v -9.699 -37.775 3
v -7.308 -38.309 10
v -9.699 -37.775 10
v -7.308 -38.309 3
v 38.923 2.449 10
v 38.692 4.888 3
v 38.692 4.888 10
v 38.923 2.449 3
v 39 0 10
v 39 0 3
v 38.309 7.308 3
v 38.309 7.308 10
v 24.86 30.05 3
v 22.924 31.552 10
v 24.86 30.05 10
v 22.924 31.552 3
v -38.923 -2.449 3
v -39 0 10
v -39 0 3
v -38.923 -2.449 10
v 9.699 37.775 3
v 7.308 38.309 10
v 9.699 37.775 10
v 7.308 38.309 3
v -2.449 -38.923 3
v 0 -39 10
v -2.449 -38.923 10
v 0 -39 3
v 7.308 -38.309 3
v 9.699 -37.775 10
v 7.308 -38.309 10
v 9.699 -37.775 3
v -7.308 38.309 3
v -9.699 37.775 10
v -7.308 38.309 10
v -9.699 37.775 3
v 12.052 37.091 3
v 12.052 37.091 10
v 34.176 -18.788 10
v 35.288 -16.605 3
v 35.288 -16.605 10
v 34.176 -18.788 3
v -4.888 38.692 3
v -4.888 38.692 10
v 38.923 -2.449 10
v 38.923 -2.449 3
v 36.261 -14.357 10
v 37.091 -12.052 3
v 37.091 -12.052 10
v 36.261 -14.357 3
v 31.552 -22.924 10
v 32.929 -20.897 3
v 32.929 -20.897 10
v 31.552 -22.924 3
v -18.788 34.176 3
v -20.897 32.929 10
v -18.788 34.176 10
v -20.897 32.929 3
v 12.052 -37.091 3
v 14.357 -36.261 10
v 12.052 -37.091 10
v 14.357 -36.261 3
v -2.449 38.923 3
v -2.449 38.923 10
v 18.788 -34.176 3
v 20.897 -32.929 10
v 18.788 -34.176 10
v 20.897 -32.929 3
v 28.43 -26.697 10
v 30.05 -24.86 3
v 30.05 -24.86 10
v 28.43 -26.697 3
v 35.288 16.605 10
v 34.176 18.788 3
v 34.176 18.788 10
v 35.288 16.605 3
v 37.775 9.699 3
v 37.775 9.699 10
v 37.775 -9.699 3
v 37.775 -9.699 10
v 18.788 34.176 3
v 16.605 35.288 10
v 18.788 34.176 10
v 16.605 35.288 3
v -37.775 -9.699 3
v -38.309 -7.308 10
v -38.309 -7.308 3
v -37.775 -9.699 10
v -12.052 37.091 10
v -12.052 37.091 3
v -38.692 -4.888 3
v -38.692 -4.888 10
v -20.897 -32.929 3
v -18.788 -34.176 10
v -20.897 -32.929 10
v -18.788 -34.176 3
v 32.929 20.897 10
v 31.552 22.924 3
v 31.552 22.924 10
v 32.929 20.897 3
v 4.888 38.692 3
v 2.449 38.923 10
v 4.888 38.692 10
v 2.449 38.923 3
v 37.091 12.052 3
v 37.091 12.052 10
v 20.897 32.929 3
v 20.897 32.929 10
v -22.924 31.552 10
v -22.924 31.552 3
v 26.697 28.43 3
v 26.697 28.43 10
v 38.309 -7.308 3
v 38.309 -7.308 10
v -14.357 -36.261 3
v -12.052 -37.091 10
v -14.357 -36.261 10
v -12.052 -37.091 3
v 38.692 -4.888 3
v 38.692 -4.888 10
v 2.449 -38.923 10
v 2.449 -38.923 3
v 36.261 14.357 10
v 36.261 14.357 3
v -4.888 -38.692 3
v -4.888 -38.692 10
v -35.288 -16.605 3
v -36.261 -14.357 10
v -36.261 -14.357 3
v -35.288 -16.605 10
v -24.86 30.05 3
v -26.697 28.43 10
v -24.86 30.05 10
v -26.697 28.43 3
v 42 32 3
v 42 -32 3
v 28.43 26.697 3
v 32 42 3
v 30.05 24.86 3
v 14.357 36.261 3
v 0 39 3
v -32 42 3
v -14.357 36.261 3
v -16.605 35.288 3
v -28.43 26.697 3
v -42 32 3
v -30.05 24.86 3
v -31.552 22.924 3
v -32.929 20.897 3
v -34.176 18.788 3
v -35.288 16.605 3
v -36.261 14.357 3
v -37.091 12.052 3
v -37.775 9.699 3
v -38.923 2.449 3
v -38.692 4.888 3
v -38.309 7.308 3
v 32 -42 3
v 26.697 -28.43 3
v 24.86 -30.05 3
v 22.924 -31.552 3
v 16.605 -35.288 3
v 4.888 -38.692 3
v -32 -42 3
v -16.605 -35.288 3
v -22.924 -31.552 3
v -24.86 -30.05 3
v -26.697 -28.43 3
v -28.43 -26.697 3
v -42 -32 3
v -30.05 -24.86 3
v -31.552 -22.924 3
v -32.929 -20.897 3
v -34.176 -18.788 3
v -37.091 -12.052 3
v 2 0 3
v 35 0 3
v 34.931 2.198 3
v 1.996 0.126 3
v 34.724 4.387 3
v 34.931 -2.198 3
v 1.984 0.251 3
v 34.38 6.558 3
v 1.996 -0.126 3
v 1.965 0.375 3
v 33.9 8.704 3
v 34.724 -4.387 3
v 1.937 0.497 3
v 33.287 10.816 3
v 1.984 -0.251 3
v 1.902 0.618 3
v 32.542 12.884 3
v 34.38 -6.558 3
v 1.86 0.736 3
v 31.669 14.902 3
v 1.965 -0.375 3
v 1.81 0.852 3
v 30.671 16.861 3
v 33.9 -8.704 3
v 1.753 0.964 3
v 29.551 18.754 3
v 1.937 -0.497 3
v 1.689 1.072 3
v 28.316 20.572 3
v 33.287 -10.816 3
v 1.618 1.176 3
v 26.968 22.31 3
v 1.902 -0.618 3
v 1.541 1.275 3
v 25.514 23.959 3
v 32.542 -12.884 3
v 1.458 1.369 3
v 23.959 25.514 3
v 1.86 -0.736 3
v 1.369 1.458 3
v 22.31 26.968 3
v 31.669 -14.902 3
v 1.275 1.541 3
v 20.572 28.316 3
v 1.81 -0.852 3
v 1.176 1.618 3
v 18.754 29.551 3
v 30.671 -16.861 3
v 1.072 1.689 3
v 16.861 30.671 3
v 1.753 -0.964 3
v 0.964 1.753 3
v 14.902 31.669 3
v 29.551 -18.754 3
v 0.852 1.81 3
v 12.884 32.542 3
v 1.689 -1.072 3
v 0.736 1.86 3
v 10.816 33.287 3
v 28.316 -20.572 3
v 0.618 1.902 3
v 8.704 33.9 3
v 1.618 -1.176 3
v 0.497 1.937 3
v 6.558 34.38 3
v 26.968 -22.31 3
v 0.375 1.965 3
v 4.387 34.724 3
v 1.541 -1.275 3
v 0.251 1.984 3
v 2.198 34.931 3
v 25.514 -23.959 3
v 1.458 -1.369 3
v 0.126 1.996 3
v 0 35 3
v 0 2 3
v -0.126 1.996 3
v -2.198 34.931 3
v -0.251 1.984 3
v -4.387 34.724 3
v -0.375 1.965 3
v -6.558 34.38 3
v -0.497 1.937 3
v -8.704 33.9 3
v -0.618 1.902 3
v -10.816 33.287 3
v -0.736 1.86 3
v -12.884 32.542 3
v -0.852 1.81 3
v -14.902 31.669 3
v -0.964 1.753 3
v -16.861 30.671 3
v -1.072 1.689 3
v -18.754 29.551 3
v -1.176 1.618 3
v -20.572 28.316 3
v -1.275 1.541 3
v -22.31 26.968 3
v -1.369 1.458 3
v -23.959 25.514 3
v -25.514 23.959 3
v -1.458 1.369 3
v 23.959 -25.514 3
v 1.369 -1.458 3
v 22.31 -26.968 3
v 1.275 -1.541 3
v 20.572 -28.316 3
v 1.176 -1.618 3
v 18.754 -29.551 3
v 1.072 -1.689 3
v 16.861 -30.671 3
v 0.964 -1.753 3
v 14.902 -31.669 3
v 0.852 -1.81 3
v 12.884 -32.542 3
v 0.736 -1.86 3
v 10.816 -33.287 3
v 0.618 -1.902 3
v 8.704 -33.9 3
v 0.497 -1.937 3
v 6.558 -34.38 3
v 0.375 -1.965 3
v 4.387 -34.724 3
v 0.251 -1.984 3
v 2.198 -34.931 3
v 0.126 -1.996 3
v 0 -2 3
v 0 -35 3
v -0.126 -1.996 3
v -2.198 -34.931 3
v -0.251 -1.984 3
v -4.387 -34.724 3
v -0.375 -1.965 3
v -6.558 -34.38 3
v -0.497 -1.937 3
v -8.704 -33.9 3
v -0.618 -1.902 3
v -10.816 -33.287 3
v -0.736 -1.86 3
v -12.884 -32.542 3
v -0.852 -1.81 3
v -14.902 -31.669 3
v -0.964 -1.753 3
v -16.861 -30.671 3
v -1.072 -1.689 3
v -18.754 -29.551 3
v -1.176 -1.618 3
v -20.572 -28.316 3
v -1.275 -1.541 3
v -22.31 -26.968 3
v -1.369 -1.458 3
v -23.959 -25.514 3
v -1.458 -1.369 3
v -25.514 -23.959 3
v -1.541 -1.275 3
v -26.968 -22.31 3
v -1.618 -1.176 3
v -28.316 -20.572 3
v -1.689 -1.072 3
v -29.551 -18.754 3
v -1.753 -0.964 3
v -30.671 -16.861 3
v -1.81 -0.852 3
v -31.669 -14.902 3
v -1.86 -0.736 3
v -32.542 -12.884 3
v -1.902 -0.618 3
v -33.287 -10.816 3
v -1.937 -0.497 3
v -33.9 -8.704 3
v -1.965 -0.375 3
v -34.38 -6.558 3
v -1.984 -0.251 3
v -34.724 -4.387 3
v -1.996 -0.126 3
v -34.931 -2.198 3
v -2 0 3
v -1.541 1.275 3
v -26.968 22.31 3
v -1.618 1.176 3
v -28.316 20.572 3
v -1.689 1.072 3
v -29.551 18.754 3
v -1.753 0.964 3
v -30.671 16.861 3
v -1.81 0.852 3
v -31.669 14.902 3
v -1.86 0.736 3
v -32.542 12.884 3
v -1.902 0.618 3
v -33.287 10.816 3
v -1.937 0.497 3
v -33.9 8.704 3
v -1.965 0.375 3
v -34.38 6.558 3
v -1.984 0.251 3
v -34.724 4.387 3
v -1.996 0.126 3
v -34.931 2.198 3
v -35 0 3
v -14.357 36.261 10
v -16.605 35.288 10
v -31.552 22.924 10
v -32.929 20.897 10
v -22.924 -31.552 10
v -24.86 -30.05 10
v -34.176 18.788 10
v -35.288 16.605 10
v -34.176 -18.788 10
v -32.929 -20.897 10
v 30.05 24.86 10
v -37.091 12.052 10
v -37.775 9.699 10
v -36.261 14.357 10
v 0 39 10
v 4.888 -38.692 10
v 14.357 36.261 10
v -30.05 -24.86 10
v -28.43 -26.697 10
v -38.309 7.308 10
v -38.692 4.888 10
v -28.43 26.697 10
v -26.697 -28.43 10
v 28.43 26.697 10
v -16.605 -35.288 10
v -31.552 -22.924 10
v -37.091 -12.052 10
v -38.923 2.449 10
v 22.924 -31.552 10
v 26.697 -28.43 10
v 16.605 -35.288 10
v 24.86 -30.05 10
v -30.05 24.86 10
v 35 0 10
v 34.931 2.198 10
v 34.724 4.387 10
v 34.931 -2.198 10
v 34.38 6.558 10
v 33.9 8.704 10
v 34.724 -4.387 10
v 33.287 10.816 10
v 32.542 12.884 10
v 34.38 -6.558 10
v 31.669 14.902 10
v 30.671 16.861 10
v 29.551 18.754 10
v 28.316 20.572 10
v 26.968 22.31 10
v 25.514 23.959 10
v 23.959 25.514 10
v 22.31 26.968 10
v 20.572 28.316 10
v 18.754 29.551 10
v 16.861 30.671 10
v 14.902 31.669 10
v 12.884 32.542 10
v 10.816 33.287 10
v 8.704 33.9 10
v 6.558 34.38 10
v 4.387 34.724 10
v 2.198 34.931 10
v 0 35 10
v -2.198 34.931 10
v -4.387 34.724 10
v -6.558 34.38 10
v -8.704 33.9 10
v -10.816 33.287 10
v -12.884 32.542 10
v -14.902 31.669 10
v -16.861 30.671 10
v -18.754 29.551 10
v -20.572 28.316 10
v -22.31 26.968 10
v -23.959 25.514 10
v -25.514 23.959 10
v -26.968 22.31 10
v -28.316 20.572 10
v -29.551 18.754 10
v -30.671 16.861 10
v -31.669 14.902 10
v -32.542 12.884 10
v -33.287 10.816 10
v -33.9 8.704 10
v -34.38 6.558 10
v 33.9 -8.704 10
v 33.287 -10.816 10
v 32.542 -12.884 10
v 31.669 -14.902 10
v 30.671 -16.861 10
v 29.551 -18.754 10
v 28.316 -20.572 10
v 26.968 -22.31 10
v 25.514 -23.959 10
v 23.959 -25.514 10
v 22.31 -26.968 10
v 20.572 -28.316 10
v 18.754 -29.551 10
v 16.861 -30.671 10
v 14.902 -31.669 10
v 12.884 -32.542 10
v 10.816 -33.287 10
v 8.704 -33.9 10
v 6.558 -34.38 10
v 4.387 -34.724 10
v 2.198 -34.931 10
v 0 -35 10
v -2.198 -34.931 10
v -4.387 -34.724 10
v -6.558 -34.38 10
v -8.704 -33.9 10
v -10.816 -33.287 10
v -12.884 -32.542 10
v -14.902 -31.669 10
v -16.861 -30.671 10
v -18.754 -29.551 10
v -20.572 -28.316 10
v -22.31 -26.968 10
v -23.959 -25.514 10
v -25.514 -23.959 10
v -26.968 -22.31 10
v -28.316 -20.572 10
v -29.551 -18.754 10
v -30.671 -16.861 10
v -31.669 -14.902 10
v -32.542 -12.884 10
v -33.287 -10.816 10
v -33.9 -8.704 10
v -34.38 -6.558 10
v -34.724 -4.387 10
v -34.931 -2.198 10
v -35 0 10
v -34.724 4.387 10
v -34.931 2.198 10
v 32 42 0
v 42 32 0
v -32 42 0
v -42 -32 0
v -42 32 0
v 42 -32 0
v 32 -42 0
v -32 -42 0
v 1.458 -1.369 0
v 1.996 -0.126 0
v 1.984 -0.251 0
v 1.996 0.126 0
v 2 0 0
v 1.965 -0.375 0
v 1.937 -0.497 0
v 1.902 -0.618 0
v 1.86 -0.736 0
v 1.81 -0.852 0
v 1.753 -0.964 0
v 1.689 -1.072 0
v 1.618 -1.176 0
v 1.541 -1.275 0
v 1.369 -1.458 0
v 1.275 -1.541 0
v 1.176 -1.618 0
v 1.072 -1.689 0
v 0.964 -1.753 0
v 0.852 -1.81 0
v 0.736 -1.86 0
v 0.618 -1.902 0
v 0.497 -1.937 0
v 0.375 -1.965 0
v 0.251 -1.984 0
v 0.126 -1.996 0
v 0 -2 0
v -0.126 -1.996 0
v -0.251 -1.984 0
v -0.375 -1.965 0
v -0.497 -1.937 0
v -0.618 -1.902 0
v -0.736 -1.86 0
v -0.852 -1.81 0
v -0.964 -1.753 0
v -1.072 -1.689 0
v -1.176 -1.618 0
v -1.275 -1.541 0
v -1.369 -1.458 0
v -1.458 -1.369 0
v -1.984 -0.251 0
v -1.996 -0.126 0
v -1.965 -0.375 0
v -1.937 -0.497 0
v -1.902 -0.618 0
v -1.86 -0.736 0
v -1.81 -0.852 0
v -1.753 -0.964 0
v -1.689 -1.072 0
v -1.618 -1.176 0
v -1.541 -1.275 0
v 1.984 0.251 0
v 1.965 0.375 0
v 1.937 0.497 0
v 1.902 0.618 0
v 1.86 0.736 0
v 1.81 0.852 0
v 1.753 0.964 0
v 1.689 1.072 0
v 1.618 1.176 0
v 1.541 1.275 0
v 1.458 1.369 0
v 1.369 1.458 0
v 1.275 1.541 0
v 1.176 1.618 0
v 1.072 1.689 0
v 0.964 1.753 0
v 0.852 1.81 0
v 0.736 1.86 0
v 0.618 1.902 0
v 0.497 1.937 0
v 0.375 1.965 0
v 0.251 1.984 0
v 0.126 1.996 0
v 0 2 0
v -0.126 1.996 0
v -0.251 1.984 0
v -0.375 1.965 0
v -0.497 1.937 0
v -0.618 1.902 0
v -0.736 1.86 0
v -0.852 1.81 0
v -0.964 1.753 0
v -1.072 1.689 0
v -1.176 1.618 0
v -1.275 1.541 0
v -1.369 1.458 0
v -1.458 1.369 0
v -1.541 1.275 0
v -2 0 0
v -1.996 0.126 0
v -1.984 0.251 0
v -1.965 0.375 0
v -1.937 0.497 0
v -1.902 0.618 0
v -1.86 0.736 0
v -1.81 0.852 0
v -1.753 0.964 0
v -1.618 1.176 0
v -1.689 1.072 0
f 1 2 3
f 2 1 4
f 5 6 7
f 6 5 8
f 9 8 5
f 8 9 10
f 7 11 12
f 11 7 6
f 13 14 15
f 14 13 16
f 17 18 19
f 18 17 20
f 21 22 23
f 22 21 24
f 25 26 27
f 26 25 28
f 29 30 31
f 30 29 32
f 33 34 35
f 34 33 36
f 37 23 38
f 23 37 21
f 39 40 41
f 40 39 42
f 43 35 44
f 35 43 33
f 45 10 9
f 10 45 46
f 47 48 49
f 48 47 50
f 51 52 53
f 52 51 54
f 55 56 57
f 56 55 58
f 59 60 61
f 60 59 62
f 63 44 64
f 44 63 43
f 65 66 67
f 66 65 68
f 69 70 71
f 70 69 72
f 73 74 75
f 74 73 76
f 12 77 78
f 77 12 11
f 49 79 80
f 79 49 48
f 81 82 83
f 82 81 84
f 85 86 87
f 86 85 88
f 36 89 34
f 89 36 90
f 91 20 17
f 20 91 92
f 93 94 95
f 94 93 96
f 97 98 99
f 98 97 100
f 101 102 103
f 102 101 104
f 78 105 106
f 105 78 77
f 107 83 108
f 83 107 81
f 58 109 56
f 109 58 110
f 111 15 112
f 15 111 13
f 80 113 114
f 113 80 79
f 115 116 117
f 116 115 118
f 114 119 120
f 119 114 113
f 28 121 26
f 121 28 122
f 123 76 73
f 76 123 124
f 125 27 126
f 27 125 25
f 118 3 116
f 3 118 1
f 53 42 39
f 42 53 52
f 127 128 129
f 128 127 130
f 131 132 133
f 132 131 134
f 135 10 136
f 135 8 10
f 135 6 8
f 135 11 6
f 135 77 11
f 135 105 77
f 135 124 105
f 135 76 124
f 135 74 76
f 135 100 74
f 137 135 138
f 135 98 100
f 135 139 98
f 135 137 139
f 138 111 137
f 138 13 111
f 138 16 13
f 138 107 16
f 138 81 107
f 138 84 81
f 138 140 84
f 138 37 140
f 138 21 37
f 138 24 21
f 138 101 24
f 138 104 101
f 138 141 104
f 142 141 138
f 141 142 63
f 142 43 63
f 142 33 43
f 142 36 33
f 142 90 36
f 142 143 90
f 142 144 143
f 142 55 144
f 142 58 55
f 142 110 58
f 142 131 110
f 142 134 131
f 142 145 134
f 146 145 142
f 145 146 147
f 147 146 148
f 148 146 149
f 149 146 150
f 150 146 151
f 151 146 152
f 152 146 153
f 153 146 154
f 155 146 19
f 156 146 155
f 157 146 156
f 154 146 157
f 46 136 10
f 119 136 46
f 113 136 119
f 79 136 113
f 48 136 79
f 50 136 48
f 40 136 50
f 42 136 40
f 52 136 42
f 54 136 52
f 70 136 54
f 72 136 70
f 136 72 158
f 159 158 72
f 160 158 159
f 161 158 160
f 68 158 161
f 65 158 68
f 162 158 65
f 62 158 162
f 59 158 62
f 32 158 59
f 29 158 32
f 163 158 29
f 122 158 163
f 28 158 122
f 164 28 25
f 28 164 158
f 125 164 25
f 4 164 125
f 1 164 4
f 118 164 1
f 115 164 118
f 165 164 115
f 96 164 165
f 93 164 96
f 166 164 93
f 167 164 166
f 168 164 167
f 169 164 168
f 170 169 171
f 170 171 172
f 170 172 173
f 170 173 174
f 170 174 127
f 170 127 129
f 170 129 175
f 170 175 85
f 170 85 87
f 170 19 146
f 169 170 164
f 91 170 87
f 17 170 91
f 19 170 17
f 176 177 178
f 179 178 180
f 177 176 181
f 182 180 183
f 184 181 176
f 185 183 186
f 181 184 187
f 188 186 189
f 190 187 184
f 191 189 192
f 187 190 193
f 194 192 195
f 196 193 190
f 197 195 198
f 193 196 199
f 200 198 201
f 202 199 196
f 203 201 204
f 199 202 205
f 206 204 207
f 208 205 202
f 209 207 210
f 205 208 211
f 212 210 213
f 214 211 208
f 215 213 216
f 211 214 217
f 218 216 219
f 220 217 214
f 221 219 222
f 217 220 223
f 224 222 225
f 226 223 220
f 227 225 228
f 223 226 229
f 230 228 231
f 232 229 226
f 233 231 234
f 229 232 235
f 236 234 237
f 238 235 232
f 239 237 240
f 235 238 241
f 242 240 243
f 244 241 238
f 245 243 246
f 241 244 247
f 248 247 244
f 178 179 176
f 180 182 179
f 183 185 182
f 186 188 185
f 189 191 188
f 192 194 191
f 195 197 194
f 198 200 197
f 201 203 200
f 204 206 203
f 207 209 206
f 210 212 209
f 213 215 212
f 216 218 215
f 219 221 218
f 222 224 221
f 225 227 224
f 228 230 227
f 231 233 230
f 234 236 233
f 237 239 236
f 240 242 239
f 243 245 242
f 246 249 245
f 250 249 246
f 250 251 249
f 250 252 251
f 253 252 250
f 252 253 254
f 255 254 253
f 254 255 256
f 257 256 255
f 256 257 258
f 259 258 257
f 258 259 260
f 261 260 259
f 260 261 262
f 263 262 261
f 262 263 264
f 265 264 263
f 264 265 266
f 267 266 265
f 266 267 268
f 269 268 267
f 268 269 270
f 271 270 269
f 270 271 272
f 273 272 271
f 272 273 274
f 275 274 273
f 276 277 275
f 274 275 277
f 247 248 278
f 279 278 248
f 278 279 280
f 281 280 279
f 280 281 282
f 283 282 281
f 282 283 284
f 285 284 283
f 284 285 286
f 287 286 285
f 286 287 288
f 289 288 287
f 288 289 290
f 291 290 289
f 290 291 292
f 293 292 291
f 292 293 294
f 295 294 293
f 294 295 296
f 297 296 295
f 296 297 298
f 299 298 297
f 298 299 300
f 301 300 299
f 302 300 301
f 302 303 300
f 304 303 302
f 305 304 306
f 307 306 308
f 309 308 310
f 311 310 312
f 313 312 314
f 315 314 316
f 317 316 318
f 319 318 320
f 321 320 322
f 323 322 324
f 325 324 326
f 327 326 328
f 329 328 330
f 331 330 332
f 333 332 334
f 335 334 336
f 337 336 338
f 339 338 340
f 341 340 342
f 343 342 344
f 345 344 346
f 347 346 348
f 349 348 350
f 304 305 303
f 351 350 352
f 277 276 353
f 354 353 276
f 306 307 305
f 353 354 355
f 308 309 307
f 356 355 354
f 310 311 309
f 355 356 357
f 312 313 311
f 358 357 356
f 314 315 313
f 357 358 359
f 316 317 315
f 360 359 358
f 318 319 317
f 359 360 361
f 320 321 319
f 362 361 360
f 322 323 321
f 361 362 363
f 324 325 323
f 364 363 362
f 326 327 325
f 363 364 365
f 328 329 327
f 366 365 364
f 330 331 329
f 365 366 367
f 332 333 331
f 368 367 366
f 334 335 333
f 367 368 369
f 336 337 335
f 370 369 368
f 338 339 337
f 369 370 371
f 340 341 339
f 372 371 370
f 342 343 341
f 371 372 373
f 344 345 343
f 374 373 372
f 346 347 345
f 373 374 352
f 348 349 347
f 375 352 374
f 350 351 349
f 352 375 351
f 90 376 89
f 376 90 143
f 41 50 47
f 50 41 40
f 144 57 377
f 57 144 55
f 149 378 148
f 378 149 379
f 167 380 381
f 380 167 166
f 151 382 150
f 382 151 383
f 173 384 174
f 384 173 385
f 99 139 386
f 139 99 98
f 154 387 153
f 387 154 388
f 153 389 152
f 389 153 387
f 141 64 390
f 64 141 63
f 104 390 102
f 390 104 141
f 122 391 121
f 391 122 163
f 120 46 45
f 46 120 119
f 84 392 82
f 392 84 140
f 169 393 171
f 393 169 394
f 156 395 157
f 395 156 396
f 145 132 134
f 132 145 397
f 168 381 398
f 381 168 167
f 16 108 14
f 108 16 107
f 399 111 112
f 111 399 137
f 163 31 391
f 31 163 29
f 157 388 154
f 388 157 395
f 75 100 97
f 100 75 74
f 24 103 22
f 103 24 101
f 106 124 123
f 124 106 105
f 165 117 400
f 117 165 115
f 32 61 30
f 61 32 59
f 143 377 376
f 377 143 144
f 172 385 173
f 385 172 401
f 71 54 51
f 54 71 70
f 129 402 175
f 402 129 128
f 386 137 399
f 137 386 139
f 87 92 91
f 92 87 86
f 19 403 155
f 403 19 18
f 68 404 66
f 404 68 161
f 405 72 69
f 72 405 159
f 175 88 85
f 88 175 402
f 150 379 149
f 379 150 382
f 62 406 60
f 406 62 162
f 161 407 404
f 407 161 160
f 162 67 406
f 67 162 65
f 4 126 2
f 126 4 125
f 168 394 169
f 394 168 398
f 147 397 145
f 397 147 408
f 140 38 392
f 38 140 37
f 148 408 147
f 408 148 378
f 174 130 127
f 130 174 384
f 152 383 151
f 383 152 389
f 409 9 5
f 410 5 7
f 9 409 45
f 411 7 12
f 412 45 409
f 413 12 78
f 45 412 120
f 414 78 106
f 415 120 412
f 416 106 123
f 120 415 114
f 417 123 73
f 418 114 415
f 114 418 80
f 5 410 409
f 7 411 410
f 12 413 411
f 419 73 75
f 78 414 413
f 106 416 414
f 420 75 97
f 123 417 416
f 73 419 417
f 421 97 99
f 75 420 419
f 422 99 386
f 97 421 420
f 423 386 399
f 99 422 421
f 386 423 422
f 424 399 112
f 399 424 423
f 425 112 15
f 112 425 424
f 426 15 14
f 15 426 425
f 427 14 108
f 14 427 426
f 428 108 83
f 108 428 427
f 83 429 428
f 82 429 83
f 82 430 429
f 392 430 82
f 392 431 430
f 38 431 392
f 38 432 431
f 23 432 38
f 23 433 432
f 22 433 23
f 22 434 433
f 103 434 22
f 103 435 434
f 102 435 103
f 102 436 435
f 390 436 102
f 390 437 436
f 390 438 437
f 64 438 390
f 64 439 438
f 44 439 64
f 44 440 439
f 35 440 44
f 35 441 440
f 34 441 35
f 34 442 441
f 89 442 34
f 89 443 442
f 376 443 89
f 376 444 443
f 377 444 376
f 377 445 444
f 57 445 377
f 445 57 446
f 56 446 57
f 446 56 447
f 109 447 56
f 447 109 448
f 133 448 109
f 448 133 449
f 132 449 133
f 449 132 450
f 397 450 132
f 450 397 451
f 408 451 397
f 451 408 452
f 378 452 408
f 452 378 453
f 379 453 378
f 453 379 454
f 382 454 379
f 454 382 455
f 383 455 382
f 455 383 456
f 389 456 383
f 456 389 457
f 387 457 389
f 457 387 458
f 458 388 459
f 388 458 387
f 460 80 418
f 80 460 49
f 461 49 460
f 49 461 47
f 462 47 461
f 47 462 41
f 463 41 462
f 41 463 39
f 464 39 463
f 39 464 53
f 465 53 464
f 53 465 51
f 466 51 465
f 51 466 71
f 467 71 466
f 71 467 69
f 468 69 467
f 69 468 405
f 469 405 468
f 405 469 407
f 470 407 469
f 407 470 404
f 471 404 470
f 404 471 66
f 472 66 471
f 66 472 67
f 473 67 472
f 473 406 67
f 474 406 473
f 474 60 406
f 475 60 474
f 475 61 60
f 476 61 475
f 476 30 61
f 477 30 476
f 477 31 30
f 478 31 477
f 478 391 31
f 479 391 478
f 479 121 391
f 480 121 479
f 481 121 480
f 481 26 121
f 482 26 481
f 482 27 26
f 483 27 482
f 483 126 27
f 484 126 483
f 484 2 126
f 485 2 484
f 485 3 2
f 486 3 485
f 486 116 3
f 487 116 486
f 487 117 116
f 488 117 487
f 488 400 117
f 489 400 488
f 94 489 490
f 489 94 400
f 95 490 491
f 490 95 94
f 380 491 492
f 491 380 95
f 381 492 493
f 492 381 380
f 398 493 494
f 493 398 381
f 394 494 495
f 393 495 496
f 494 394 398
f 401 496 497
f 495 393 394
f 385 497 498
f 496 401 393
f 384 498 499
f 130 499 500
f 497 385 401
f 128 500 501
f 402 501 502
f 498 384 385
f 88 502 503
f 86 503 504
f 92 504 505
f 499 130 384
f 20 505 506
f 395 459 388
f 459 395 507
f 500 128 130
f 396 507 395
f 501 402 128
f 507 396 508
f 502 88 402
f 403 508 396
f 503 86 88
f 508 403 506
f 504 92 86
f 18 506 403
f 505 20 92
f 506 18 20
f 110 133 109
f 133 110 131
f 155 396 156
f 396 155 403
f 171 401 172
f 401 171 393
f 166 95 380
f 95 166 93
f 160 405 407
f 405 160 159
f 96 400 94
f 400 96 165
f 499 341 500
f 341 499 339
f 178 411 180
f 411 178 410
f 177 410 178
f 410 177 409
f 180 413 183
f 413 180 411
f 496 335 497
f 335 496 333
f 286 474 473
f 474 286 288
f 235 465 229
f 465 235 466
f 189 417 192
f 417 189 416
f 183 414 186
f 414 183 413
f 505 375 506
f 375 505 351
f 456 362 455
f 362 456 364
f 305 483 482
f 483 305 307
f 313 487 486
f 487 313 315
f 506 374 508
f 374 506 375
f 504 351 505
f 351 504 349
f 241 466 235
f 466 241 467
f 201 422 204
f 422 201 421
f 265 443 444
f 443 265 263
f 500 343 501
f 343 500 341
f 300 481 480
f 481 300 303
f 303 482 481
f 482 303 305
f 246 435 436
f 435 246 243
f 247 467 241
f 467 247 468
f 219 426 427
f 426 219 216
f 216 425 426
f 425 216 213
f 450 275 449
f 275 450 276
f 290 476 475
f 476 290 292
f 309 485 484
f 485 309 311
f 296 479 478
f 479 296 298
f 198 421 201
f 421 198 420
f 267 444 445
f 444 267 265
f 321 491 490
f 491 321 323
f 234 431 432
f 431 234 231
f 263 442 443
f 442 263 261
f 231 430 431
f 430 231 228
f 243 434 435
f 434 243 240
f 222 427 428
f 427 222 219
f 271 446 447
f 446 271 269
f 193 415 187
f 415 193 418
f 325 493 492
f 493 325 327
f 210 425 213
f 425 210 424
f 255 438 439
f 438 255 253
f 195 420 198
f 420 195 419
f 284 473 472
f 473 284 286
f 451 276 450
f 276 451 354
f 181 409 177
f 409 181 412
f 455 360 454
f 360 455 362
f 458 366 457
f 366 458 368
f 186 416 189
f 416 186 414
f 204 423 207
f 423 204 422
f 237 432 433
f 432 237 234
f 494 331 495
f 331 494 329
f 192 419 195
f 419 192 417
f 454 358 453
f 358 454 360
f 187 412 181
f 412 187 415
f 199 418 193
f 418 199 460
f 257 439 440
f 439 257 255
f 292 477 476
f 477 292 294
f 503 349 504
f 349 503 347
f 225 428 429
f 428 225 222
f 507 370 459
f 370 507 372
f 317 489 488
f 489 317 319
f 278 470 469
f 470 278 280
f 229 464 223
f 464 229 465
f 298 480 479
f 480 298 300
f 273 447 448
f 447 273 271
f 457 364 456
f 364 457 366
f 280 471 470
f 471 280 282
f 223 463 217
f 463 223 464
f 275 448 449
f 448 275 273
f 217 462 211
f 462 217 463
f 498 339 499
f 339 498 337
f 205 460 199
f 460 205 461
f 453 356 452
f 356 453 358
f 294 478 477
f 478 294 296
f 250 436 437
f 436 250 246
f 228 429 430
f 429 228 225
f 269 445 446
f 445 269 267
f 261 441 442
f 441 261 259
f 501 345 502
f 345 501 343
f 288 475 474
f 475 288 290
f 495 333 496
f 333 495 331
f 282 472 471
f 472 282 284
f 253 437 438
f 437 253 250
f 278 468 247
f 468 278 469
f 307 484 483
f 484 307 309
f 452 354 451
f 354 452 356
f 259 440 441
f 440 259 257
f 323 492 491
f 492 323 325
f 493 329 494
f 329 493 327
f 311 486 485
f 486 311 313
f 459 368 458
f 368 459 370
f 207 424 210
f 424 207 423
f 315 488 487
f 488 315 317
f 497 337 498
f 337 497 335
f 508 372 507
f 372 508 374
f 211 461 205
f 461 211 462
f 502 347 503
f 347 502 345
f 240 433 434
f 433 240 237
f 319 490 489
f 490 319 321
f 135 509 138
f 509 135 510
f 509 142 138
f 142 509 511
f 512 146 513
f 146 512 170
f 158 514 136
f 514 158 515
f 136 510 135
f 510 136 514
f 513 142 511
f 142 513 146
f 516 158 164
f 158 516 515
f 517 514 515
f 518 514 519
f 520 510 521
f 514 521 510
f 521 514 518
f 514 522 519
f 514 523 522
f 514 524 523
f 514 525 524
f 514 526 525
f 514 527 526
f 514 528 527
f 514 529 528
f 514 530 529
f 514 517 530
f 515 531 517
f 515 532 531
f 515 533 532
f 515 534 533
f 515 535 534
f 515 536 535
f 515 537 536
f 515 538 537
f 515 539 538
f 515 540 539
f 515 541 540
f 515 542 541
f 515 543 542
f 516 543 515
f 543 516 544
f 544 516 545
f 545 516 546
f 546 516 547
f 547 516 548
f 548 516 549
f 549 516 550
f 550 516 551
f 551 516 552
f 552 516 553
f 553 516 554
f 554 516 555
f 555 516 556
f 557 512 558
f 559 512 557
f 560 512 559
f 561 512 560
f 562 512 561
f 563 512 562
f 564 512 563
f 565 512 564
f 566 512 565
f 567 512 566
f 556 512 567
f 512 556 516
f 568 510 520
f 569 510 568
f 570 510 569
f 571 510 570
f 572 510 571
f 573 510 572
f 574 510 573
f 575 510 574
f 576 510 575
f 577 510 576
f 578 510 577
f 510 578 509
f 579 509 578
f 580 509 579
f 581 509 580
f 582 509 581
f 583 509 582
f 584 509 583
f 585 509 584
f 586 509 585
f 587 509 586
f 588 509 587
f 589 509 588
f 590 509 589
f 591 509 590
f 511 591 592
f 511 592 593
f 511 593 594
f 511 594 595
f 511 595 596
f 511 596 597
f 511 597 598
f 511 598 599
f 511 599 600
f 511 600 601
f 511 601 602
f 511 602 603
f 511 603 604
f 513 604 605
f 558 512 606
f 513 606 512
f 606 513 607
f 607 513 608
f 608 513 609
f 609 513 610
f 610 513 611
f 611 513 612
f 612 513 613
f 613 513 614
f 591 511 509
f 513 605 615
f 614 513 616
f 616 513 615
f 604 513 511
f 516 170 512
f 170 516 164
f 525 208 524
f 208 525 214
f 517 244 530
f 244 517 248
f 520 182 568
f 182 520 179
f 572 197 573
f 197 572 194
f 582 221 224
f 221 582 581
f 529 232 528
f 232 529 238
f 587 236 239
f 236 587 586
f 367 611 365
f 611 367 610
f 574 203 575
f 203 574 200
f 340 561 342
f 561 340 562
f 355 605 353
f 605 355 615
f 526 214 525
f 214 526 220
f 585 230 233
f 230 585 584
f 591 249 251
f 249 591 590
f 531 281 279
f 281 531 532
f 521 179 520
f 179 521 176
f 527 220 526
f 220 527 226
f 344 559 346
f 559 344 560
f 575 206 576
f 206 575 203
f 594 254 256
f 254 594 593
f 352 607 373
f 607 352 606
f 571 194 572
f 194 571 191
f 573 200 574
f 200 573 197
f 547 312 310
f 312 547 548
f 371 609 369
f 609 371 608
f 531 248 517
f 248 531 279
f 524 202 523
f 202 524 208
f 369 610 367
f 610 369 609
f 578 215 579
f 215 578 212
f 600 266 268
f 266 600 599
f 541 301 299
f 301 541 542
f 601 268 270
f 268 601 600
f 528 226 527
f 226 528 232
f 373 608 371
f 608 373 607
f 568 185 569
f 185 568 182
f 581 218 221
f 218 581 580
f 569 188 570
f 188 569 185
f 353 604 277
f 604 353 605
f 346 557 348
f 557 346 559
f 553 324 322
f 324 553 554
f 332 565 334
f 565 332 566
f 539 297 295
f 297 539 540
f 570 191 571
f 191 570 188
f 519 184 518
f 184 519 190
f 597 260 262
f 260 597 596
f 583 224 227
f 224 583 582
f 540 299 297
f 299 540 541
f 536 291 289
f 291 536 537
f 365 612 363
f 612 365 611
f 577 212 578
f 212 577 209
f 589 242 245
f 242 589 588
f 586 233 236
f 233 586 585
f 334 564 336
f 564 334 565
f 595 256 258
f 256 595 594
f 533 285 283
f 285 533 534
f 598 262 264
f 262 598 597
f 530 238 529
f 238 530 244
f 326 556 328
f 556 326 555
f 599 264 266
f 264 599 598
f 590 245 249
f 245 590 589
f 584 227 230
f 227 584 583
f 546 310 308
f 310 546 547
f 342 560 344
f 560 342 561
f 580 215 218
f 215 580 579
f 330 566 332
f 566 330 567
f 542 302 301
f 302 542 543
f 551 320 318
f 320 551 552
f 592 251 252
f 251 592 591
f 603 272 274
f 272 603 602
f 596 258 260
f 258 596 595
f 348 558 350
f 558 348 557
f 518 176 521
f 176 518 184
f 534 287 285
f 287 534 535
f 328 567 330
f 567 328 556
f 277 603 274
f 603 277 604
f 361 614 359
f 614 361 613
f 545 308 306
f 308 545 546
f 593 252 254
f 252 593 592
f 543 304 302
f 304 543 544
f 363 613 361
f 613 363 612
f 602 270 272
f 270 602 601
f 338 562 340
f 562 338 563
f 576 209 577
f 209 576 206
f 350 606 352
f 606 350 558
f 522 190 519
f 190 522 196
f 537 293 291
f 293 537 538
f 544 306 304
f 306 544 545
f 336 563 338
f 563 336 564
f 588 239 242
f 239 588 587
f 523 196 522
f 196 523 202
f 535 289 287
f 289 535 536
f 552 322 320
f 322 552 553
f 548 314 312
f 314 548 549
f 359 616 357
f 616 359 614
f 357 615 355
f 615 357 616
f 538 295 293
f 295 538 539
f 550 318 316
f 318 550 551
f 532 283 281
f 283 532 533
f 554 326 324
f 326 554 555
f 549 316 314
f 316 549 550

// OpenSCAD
$fn=100;

size = 84;
height = 3;
inset = 10;

difference() {
union() {
translate([-(size/2), -(size/2), 0])
chamfered_box([size, size, height], inset);
difference() {
translate([0, 0, 3])
    cylinder(d=78, h=7);
    
translate([0, 0, 3])
    cylinder(d=70, h=7);


}
}
translate([0, 0, 0])
    cylinder(d=4, h=10);
}



module chamfered_box(dim, c) {
    x = dim[0];
    y = dim[1];
    z = dim[2];

    polyhedron(
        points = [
            // Bottom ring
            [c,   0,   0],
            [x-c, 0,   0],
            [x,   c,   0],
            [x,   y-c, 0],
            [x-c, y,   0],
            [c,   y,   0],
            [0,   y-c, 0],
            [0,   c,   0],

            // Top ring
            [c,   0,   z],
            [x-c, 0,   z],
            [x,   c,   z],
            [x,   y-c, z],
            [x-c, y,   z],
            [c,   y,   z],
            [0,   y-c, z],
            [0,   c,   z]
        ],

        faces = [
            [0,1,2,3,4,5,6,7],       // bottom
            [8,15,14,13,12,11,10,9], // top

            [0,8,9,1],               // front
            [1,9,10,2],              // right
            [2,10,11,3],              // back
            [3,11,12,4],              // back-right
            [4,12,13,5],              // back
            [5,13,14,6],              // left
            [6,14,15,7],              // front-left
            [7,15,8,0]                // front
        ]
    );
}
